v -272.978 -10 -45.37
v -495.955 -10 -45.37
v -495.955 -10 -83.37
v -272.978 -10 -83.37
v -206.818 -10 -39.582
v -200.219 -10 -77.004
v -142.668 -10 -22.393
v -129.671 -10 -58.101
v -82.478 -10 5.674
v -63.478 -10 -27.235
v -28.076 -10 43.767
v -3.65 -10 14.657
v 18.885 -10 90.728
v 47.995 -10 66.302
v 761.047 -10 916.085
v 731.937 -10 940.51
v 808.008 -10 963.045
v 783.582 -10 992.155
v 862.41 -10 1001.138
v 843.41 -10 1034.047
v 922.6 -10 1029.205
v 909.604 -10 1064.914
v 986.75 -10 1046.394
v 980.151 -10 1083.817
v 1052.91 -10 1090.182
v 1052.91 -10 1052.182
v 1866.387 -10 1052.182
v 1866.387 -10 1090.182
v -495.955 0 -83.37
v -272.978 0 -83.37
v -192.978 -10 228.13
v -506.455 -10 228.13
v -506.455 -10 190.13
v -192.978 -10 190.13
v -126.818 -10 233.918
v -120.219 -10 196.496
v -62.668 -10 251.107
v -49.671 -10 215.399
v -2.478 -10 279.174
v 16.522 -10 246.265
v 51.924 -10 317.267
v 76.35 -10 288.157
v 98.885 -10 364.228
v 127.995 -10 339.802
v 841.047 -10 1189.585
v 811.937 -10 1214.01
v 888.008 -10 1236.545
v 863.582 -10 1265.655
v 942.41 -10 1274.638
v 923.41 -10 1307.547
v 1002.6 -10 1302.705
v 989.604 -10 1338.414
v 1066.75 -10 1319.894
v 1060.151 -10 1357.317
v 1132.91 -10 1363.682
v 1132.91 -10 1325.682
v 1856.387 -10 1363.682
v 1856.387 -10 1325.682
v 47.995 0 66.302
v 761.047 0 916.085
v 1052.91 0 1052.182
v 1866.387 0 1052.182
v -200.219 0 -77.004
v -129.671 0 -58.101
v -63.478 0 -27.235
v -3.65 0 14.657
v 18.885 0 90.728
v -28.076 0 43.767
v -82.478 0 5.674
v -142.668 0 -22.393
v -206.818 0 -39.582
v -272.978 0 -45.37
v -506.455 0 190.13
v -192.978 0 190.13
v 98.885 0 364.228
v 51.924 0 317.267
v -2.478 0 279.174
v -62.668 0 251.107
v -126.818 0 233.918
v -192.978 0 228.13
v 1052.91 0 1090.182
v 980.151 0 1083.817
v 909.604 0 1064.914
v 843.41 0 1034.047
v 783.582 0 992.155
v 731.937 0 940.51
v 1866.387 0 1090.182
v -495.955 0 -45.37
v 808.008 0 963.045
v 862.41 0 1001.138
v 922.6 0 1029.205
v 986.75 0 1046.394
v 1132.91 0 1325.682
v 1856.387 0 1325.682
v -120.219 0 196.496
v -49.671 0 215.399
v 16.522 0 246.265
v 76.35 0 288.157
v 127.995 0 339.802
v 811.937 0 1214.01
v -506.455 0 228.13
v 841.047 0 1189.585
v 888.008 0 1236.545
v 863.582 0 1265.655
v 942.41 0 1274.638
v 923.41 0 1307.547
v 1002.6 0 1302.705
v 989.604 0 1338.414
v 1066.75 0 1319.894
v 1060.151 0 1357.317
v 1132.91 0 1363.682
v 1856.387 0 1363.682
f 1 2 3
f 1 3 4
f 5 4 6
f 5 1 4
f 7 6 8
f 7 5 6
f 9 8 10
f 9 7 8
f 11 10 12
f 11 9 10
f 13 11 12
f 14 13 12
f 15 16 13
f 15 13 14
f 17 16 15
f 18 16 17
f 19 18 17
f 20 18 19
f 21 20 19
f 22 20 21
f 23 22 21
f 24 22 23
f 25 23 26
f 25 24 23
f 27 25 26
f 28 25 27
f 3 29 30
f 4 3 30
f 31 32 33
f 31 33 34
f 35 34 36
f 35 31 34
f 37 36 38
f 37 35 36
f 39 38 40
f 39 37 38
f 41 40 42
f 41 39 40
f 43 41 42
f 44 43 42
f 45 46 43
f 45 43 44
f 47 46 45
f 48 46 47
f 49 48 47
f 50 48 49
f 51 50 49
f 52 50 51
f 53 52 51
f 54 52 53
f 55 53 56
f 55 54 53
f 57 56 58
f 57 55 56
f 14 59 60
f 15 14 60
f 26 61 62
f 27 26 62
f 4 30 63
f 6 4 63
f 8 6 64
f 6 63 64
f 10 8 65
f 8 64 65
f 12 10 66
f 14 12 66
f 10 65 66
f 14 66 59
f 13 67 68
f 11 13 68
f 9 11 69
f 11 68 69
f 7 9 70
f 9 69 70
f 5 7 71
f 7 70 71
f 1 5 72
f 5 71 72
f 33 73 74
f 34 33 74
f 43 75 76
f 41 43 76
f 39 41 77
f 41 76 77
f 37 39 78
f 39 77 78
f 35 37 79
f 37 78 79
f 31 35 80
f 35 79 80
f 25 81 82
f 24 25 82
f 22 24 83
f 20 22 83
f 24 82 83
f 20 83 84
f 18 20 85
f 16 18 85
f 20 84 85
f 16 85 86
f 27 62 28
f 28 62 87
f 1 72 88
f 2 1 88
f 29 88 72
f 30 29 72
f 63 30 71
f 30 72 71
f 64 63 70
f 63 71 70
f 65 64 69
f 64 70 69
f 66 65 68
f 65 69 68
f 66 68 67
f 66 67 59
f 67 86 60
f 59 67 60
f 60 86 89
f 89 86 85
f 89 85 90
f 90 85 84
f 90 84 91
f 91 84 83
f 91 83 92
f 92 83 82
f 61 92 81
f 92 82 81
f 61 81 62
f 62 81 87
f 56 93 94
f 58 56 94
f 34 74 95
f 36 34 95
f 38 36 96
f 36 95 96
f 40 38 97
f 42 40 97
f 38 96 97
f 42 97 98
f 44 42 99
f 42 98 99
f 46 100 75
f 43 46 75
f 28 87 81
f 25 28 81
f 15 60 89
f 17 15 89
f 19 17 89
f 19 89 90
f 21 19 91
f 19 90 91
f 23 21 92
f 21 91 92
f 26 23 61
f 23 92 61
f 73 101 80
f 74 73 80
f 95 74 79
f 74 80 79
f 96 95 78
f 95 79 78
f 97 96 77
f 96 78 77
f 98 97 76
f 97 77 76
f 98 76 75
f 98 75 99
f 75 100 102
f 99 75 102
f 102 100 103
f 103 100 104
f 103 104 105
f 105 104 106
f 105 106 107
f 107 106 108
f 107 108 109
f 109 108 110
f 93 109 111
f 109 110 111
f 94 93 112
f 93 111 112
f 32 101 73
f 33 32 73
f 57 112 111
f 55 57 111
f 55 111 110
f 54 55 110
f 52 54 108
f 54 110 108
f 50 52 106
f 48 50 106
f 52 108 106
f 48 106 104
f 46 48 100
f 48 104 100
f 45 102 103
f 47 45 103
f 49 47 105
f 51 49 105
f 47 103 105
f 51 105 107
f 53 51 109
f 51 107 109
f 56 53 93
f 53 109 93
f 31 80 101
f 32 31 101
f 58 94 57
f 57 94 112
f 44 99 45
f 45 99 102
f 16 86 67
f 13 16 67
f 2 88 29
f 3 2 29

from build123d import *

# Parameters (mm, degrees)
F1_DEPTH = 10


with BuildPart() as f1:
    # F0 (on Front) → F1 (new body)
    with BuildSketch(Plane.XZ):
        with BuildLine():
            Line((1052.909969, 1052.182435), (1866.386906, 1052.182435))
            Line((1866.386906, 1052.182435), (1866.386906, 1090.182435))
            Line((1866.386906, 1090.182435), (1052.909969, 1090.182435))
            ThreePointArc((1052.909969, 1090.182435), (875.832917, 1050.925398), (731.937347, 940.510444))
            Line((731.937347, 940.510444), (18.88517, 90.727949))
            ThreePointArc((18.88517, 90.727949), (-111.960205, -9.673238), (-272.977763, -45.369971))
            Line((-272.977763, -45.369971), (-495.9547, -45.369971))
            Line((-495.9547, -45.369971), (-495.9547, -83.369971))
            Line((-495.9547, -83.369971), (-272.977763, -83.369971))
            ThreePointArc((-272.977763, -83.369971), (-95.900711, -44.112934), (47.994859, 66.30202))
            Line((47.994859, 66.30202), (761.047036, 916.084514))
            ThreePointArc((761.047036, 916.084514), (891.892411, 1016.485702), (1052.909969, 1052.182435))
        make_face()
        with BuildLine():
            Line((1132.909969, 1325.682435), (1856.386906, 1325.682435))
            Line((1856.386906, 1325.682435), (1856.386906, 1363.682435))
            Line((1856.386906, 1363.682435), (1132.909969, 1363.682435))
            ThreePointArc((1132.909969, 1363.682435), (955.832917, 1324.425398), (811.937347, 1214.010444))
            Line((811.937347, 1214.010444), (98.88517, 364.227949))
            ThreePointArc((98.88517, 364.227949), (-31.960205, 263.826762), (-192.977763, 228.130029))
            Line((-192.977763, 228.130029), (-506.4547, 228.130029))
            Line((-506.4547, 228.130029), (-506.4547, 190.130029))
            Line((-506.4547, 190.130029), (-192.977763, 190.130029))
            ThreePointArc((-192.977763, 190.130029), (-15.900711, 229.387066), (127.994859, 339.80202))
            Line((127.994859, 339.80202), (841.047036, 1189.584514))
            ThreePointArc((841.047036, 1189.584514), (971.892411, 1289.985702), (1132.909969, 1325.682435))
        make_face()
    extrude(amount=F1_DEPTH)


solid = f1.part
